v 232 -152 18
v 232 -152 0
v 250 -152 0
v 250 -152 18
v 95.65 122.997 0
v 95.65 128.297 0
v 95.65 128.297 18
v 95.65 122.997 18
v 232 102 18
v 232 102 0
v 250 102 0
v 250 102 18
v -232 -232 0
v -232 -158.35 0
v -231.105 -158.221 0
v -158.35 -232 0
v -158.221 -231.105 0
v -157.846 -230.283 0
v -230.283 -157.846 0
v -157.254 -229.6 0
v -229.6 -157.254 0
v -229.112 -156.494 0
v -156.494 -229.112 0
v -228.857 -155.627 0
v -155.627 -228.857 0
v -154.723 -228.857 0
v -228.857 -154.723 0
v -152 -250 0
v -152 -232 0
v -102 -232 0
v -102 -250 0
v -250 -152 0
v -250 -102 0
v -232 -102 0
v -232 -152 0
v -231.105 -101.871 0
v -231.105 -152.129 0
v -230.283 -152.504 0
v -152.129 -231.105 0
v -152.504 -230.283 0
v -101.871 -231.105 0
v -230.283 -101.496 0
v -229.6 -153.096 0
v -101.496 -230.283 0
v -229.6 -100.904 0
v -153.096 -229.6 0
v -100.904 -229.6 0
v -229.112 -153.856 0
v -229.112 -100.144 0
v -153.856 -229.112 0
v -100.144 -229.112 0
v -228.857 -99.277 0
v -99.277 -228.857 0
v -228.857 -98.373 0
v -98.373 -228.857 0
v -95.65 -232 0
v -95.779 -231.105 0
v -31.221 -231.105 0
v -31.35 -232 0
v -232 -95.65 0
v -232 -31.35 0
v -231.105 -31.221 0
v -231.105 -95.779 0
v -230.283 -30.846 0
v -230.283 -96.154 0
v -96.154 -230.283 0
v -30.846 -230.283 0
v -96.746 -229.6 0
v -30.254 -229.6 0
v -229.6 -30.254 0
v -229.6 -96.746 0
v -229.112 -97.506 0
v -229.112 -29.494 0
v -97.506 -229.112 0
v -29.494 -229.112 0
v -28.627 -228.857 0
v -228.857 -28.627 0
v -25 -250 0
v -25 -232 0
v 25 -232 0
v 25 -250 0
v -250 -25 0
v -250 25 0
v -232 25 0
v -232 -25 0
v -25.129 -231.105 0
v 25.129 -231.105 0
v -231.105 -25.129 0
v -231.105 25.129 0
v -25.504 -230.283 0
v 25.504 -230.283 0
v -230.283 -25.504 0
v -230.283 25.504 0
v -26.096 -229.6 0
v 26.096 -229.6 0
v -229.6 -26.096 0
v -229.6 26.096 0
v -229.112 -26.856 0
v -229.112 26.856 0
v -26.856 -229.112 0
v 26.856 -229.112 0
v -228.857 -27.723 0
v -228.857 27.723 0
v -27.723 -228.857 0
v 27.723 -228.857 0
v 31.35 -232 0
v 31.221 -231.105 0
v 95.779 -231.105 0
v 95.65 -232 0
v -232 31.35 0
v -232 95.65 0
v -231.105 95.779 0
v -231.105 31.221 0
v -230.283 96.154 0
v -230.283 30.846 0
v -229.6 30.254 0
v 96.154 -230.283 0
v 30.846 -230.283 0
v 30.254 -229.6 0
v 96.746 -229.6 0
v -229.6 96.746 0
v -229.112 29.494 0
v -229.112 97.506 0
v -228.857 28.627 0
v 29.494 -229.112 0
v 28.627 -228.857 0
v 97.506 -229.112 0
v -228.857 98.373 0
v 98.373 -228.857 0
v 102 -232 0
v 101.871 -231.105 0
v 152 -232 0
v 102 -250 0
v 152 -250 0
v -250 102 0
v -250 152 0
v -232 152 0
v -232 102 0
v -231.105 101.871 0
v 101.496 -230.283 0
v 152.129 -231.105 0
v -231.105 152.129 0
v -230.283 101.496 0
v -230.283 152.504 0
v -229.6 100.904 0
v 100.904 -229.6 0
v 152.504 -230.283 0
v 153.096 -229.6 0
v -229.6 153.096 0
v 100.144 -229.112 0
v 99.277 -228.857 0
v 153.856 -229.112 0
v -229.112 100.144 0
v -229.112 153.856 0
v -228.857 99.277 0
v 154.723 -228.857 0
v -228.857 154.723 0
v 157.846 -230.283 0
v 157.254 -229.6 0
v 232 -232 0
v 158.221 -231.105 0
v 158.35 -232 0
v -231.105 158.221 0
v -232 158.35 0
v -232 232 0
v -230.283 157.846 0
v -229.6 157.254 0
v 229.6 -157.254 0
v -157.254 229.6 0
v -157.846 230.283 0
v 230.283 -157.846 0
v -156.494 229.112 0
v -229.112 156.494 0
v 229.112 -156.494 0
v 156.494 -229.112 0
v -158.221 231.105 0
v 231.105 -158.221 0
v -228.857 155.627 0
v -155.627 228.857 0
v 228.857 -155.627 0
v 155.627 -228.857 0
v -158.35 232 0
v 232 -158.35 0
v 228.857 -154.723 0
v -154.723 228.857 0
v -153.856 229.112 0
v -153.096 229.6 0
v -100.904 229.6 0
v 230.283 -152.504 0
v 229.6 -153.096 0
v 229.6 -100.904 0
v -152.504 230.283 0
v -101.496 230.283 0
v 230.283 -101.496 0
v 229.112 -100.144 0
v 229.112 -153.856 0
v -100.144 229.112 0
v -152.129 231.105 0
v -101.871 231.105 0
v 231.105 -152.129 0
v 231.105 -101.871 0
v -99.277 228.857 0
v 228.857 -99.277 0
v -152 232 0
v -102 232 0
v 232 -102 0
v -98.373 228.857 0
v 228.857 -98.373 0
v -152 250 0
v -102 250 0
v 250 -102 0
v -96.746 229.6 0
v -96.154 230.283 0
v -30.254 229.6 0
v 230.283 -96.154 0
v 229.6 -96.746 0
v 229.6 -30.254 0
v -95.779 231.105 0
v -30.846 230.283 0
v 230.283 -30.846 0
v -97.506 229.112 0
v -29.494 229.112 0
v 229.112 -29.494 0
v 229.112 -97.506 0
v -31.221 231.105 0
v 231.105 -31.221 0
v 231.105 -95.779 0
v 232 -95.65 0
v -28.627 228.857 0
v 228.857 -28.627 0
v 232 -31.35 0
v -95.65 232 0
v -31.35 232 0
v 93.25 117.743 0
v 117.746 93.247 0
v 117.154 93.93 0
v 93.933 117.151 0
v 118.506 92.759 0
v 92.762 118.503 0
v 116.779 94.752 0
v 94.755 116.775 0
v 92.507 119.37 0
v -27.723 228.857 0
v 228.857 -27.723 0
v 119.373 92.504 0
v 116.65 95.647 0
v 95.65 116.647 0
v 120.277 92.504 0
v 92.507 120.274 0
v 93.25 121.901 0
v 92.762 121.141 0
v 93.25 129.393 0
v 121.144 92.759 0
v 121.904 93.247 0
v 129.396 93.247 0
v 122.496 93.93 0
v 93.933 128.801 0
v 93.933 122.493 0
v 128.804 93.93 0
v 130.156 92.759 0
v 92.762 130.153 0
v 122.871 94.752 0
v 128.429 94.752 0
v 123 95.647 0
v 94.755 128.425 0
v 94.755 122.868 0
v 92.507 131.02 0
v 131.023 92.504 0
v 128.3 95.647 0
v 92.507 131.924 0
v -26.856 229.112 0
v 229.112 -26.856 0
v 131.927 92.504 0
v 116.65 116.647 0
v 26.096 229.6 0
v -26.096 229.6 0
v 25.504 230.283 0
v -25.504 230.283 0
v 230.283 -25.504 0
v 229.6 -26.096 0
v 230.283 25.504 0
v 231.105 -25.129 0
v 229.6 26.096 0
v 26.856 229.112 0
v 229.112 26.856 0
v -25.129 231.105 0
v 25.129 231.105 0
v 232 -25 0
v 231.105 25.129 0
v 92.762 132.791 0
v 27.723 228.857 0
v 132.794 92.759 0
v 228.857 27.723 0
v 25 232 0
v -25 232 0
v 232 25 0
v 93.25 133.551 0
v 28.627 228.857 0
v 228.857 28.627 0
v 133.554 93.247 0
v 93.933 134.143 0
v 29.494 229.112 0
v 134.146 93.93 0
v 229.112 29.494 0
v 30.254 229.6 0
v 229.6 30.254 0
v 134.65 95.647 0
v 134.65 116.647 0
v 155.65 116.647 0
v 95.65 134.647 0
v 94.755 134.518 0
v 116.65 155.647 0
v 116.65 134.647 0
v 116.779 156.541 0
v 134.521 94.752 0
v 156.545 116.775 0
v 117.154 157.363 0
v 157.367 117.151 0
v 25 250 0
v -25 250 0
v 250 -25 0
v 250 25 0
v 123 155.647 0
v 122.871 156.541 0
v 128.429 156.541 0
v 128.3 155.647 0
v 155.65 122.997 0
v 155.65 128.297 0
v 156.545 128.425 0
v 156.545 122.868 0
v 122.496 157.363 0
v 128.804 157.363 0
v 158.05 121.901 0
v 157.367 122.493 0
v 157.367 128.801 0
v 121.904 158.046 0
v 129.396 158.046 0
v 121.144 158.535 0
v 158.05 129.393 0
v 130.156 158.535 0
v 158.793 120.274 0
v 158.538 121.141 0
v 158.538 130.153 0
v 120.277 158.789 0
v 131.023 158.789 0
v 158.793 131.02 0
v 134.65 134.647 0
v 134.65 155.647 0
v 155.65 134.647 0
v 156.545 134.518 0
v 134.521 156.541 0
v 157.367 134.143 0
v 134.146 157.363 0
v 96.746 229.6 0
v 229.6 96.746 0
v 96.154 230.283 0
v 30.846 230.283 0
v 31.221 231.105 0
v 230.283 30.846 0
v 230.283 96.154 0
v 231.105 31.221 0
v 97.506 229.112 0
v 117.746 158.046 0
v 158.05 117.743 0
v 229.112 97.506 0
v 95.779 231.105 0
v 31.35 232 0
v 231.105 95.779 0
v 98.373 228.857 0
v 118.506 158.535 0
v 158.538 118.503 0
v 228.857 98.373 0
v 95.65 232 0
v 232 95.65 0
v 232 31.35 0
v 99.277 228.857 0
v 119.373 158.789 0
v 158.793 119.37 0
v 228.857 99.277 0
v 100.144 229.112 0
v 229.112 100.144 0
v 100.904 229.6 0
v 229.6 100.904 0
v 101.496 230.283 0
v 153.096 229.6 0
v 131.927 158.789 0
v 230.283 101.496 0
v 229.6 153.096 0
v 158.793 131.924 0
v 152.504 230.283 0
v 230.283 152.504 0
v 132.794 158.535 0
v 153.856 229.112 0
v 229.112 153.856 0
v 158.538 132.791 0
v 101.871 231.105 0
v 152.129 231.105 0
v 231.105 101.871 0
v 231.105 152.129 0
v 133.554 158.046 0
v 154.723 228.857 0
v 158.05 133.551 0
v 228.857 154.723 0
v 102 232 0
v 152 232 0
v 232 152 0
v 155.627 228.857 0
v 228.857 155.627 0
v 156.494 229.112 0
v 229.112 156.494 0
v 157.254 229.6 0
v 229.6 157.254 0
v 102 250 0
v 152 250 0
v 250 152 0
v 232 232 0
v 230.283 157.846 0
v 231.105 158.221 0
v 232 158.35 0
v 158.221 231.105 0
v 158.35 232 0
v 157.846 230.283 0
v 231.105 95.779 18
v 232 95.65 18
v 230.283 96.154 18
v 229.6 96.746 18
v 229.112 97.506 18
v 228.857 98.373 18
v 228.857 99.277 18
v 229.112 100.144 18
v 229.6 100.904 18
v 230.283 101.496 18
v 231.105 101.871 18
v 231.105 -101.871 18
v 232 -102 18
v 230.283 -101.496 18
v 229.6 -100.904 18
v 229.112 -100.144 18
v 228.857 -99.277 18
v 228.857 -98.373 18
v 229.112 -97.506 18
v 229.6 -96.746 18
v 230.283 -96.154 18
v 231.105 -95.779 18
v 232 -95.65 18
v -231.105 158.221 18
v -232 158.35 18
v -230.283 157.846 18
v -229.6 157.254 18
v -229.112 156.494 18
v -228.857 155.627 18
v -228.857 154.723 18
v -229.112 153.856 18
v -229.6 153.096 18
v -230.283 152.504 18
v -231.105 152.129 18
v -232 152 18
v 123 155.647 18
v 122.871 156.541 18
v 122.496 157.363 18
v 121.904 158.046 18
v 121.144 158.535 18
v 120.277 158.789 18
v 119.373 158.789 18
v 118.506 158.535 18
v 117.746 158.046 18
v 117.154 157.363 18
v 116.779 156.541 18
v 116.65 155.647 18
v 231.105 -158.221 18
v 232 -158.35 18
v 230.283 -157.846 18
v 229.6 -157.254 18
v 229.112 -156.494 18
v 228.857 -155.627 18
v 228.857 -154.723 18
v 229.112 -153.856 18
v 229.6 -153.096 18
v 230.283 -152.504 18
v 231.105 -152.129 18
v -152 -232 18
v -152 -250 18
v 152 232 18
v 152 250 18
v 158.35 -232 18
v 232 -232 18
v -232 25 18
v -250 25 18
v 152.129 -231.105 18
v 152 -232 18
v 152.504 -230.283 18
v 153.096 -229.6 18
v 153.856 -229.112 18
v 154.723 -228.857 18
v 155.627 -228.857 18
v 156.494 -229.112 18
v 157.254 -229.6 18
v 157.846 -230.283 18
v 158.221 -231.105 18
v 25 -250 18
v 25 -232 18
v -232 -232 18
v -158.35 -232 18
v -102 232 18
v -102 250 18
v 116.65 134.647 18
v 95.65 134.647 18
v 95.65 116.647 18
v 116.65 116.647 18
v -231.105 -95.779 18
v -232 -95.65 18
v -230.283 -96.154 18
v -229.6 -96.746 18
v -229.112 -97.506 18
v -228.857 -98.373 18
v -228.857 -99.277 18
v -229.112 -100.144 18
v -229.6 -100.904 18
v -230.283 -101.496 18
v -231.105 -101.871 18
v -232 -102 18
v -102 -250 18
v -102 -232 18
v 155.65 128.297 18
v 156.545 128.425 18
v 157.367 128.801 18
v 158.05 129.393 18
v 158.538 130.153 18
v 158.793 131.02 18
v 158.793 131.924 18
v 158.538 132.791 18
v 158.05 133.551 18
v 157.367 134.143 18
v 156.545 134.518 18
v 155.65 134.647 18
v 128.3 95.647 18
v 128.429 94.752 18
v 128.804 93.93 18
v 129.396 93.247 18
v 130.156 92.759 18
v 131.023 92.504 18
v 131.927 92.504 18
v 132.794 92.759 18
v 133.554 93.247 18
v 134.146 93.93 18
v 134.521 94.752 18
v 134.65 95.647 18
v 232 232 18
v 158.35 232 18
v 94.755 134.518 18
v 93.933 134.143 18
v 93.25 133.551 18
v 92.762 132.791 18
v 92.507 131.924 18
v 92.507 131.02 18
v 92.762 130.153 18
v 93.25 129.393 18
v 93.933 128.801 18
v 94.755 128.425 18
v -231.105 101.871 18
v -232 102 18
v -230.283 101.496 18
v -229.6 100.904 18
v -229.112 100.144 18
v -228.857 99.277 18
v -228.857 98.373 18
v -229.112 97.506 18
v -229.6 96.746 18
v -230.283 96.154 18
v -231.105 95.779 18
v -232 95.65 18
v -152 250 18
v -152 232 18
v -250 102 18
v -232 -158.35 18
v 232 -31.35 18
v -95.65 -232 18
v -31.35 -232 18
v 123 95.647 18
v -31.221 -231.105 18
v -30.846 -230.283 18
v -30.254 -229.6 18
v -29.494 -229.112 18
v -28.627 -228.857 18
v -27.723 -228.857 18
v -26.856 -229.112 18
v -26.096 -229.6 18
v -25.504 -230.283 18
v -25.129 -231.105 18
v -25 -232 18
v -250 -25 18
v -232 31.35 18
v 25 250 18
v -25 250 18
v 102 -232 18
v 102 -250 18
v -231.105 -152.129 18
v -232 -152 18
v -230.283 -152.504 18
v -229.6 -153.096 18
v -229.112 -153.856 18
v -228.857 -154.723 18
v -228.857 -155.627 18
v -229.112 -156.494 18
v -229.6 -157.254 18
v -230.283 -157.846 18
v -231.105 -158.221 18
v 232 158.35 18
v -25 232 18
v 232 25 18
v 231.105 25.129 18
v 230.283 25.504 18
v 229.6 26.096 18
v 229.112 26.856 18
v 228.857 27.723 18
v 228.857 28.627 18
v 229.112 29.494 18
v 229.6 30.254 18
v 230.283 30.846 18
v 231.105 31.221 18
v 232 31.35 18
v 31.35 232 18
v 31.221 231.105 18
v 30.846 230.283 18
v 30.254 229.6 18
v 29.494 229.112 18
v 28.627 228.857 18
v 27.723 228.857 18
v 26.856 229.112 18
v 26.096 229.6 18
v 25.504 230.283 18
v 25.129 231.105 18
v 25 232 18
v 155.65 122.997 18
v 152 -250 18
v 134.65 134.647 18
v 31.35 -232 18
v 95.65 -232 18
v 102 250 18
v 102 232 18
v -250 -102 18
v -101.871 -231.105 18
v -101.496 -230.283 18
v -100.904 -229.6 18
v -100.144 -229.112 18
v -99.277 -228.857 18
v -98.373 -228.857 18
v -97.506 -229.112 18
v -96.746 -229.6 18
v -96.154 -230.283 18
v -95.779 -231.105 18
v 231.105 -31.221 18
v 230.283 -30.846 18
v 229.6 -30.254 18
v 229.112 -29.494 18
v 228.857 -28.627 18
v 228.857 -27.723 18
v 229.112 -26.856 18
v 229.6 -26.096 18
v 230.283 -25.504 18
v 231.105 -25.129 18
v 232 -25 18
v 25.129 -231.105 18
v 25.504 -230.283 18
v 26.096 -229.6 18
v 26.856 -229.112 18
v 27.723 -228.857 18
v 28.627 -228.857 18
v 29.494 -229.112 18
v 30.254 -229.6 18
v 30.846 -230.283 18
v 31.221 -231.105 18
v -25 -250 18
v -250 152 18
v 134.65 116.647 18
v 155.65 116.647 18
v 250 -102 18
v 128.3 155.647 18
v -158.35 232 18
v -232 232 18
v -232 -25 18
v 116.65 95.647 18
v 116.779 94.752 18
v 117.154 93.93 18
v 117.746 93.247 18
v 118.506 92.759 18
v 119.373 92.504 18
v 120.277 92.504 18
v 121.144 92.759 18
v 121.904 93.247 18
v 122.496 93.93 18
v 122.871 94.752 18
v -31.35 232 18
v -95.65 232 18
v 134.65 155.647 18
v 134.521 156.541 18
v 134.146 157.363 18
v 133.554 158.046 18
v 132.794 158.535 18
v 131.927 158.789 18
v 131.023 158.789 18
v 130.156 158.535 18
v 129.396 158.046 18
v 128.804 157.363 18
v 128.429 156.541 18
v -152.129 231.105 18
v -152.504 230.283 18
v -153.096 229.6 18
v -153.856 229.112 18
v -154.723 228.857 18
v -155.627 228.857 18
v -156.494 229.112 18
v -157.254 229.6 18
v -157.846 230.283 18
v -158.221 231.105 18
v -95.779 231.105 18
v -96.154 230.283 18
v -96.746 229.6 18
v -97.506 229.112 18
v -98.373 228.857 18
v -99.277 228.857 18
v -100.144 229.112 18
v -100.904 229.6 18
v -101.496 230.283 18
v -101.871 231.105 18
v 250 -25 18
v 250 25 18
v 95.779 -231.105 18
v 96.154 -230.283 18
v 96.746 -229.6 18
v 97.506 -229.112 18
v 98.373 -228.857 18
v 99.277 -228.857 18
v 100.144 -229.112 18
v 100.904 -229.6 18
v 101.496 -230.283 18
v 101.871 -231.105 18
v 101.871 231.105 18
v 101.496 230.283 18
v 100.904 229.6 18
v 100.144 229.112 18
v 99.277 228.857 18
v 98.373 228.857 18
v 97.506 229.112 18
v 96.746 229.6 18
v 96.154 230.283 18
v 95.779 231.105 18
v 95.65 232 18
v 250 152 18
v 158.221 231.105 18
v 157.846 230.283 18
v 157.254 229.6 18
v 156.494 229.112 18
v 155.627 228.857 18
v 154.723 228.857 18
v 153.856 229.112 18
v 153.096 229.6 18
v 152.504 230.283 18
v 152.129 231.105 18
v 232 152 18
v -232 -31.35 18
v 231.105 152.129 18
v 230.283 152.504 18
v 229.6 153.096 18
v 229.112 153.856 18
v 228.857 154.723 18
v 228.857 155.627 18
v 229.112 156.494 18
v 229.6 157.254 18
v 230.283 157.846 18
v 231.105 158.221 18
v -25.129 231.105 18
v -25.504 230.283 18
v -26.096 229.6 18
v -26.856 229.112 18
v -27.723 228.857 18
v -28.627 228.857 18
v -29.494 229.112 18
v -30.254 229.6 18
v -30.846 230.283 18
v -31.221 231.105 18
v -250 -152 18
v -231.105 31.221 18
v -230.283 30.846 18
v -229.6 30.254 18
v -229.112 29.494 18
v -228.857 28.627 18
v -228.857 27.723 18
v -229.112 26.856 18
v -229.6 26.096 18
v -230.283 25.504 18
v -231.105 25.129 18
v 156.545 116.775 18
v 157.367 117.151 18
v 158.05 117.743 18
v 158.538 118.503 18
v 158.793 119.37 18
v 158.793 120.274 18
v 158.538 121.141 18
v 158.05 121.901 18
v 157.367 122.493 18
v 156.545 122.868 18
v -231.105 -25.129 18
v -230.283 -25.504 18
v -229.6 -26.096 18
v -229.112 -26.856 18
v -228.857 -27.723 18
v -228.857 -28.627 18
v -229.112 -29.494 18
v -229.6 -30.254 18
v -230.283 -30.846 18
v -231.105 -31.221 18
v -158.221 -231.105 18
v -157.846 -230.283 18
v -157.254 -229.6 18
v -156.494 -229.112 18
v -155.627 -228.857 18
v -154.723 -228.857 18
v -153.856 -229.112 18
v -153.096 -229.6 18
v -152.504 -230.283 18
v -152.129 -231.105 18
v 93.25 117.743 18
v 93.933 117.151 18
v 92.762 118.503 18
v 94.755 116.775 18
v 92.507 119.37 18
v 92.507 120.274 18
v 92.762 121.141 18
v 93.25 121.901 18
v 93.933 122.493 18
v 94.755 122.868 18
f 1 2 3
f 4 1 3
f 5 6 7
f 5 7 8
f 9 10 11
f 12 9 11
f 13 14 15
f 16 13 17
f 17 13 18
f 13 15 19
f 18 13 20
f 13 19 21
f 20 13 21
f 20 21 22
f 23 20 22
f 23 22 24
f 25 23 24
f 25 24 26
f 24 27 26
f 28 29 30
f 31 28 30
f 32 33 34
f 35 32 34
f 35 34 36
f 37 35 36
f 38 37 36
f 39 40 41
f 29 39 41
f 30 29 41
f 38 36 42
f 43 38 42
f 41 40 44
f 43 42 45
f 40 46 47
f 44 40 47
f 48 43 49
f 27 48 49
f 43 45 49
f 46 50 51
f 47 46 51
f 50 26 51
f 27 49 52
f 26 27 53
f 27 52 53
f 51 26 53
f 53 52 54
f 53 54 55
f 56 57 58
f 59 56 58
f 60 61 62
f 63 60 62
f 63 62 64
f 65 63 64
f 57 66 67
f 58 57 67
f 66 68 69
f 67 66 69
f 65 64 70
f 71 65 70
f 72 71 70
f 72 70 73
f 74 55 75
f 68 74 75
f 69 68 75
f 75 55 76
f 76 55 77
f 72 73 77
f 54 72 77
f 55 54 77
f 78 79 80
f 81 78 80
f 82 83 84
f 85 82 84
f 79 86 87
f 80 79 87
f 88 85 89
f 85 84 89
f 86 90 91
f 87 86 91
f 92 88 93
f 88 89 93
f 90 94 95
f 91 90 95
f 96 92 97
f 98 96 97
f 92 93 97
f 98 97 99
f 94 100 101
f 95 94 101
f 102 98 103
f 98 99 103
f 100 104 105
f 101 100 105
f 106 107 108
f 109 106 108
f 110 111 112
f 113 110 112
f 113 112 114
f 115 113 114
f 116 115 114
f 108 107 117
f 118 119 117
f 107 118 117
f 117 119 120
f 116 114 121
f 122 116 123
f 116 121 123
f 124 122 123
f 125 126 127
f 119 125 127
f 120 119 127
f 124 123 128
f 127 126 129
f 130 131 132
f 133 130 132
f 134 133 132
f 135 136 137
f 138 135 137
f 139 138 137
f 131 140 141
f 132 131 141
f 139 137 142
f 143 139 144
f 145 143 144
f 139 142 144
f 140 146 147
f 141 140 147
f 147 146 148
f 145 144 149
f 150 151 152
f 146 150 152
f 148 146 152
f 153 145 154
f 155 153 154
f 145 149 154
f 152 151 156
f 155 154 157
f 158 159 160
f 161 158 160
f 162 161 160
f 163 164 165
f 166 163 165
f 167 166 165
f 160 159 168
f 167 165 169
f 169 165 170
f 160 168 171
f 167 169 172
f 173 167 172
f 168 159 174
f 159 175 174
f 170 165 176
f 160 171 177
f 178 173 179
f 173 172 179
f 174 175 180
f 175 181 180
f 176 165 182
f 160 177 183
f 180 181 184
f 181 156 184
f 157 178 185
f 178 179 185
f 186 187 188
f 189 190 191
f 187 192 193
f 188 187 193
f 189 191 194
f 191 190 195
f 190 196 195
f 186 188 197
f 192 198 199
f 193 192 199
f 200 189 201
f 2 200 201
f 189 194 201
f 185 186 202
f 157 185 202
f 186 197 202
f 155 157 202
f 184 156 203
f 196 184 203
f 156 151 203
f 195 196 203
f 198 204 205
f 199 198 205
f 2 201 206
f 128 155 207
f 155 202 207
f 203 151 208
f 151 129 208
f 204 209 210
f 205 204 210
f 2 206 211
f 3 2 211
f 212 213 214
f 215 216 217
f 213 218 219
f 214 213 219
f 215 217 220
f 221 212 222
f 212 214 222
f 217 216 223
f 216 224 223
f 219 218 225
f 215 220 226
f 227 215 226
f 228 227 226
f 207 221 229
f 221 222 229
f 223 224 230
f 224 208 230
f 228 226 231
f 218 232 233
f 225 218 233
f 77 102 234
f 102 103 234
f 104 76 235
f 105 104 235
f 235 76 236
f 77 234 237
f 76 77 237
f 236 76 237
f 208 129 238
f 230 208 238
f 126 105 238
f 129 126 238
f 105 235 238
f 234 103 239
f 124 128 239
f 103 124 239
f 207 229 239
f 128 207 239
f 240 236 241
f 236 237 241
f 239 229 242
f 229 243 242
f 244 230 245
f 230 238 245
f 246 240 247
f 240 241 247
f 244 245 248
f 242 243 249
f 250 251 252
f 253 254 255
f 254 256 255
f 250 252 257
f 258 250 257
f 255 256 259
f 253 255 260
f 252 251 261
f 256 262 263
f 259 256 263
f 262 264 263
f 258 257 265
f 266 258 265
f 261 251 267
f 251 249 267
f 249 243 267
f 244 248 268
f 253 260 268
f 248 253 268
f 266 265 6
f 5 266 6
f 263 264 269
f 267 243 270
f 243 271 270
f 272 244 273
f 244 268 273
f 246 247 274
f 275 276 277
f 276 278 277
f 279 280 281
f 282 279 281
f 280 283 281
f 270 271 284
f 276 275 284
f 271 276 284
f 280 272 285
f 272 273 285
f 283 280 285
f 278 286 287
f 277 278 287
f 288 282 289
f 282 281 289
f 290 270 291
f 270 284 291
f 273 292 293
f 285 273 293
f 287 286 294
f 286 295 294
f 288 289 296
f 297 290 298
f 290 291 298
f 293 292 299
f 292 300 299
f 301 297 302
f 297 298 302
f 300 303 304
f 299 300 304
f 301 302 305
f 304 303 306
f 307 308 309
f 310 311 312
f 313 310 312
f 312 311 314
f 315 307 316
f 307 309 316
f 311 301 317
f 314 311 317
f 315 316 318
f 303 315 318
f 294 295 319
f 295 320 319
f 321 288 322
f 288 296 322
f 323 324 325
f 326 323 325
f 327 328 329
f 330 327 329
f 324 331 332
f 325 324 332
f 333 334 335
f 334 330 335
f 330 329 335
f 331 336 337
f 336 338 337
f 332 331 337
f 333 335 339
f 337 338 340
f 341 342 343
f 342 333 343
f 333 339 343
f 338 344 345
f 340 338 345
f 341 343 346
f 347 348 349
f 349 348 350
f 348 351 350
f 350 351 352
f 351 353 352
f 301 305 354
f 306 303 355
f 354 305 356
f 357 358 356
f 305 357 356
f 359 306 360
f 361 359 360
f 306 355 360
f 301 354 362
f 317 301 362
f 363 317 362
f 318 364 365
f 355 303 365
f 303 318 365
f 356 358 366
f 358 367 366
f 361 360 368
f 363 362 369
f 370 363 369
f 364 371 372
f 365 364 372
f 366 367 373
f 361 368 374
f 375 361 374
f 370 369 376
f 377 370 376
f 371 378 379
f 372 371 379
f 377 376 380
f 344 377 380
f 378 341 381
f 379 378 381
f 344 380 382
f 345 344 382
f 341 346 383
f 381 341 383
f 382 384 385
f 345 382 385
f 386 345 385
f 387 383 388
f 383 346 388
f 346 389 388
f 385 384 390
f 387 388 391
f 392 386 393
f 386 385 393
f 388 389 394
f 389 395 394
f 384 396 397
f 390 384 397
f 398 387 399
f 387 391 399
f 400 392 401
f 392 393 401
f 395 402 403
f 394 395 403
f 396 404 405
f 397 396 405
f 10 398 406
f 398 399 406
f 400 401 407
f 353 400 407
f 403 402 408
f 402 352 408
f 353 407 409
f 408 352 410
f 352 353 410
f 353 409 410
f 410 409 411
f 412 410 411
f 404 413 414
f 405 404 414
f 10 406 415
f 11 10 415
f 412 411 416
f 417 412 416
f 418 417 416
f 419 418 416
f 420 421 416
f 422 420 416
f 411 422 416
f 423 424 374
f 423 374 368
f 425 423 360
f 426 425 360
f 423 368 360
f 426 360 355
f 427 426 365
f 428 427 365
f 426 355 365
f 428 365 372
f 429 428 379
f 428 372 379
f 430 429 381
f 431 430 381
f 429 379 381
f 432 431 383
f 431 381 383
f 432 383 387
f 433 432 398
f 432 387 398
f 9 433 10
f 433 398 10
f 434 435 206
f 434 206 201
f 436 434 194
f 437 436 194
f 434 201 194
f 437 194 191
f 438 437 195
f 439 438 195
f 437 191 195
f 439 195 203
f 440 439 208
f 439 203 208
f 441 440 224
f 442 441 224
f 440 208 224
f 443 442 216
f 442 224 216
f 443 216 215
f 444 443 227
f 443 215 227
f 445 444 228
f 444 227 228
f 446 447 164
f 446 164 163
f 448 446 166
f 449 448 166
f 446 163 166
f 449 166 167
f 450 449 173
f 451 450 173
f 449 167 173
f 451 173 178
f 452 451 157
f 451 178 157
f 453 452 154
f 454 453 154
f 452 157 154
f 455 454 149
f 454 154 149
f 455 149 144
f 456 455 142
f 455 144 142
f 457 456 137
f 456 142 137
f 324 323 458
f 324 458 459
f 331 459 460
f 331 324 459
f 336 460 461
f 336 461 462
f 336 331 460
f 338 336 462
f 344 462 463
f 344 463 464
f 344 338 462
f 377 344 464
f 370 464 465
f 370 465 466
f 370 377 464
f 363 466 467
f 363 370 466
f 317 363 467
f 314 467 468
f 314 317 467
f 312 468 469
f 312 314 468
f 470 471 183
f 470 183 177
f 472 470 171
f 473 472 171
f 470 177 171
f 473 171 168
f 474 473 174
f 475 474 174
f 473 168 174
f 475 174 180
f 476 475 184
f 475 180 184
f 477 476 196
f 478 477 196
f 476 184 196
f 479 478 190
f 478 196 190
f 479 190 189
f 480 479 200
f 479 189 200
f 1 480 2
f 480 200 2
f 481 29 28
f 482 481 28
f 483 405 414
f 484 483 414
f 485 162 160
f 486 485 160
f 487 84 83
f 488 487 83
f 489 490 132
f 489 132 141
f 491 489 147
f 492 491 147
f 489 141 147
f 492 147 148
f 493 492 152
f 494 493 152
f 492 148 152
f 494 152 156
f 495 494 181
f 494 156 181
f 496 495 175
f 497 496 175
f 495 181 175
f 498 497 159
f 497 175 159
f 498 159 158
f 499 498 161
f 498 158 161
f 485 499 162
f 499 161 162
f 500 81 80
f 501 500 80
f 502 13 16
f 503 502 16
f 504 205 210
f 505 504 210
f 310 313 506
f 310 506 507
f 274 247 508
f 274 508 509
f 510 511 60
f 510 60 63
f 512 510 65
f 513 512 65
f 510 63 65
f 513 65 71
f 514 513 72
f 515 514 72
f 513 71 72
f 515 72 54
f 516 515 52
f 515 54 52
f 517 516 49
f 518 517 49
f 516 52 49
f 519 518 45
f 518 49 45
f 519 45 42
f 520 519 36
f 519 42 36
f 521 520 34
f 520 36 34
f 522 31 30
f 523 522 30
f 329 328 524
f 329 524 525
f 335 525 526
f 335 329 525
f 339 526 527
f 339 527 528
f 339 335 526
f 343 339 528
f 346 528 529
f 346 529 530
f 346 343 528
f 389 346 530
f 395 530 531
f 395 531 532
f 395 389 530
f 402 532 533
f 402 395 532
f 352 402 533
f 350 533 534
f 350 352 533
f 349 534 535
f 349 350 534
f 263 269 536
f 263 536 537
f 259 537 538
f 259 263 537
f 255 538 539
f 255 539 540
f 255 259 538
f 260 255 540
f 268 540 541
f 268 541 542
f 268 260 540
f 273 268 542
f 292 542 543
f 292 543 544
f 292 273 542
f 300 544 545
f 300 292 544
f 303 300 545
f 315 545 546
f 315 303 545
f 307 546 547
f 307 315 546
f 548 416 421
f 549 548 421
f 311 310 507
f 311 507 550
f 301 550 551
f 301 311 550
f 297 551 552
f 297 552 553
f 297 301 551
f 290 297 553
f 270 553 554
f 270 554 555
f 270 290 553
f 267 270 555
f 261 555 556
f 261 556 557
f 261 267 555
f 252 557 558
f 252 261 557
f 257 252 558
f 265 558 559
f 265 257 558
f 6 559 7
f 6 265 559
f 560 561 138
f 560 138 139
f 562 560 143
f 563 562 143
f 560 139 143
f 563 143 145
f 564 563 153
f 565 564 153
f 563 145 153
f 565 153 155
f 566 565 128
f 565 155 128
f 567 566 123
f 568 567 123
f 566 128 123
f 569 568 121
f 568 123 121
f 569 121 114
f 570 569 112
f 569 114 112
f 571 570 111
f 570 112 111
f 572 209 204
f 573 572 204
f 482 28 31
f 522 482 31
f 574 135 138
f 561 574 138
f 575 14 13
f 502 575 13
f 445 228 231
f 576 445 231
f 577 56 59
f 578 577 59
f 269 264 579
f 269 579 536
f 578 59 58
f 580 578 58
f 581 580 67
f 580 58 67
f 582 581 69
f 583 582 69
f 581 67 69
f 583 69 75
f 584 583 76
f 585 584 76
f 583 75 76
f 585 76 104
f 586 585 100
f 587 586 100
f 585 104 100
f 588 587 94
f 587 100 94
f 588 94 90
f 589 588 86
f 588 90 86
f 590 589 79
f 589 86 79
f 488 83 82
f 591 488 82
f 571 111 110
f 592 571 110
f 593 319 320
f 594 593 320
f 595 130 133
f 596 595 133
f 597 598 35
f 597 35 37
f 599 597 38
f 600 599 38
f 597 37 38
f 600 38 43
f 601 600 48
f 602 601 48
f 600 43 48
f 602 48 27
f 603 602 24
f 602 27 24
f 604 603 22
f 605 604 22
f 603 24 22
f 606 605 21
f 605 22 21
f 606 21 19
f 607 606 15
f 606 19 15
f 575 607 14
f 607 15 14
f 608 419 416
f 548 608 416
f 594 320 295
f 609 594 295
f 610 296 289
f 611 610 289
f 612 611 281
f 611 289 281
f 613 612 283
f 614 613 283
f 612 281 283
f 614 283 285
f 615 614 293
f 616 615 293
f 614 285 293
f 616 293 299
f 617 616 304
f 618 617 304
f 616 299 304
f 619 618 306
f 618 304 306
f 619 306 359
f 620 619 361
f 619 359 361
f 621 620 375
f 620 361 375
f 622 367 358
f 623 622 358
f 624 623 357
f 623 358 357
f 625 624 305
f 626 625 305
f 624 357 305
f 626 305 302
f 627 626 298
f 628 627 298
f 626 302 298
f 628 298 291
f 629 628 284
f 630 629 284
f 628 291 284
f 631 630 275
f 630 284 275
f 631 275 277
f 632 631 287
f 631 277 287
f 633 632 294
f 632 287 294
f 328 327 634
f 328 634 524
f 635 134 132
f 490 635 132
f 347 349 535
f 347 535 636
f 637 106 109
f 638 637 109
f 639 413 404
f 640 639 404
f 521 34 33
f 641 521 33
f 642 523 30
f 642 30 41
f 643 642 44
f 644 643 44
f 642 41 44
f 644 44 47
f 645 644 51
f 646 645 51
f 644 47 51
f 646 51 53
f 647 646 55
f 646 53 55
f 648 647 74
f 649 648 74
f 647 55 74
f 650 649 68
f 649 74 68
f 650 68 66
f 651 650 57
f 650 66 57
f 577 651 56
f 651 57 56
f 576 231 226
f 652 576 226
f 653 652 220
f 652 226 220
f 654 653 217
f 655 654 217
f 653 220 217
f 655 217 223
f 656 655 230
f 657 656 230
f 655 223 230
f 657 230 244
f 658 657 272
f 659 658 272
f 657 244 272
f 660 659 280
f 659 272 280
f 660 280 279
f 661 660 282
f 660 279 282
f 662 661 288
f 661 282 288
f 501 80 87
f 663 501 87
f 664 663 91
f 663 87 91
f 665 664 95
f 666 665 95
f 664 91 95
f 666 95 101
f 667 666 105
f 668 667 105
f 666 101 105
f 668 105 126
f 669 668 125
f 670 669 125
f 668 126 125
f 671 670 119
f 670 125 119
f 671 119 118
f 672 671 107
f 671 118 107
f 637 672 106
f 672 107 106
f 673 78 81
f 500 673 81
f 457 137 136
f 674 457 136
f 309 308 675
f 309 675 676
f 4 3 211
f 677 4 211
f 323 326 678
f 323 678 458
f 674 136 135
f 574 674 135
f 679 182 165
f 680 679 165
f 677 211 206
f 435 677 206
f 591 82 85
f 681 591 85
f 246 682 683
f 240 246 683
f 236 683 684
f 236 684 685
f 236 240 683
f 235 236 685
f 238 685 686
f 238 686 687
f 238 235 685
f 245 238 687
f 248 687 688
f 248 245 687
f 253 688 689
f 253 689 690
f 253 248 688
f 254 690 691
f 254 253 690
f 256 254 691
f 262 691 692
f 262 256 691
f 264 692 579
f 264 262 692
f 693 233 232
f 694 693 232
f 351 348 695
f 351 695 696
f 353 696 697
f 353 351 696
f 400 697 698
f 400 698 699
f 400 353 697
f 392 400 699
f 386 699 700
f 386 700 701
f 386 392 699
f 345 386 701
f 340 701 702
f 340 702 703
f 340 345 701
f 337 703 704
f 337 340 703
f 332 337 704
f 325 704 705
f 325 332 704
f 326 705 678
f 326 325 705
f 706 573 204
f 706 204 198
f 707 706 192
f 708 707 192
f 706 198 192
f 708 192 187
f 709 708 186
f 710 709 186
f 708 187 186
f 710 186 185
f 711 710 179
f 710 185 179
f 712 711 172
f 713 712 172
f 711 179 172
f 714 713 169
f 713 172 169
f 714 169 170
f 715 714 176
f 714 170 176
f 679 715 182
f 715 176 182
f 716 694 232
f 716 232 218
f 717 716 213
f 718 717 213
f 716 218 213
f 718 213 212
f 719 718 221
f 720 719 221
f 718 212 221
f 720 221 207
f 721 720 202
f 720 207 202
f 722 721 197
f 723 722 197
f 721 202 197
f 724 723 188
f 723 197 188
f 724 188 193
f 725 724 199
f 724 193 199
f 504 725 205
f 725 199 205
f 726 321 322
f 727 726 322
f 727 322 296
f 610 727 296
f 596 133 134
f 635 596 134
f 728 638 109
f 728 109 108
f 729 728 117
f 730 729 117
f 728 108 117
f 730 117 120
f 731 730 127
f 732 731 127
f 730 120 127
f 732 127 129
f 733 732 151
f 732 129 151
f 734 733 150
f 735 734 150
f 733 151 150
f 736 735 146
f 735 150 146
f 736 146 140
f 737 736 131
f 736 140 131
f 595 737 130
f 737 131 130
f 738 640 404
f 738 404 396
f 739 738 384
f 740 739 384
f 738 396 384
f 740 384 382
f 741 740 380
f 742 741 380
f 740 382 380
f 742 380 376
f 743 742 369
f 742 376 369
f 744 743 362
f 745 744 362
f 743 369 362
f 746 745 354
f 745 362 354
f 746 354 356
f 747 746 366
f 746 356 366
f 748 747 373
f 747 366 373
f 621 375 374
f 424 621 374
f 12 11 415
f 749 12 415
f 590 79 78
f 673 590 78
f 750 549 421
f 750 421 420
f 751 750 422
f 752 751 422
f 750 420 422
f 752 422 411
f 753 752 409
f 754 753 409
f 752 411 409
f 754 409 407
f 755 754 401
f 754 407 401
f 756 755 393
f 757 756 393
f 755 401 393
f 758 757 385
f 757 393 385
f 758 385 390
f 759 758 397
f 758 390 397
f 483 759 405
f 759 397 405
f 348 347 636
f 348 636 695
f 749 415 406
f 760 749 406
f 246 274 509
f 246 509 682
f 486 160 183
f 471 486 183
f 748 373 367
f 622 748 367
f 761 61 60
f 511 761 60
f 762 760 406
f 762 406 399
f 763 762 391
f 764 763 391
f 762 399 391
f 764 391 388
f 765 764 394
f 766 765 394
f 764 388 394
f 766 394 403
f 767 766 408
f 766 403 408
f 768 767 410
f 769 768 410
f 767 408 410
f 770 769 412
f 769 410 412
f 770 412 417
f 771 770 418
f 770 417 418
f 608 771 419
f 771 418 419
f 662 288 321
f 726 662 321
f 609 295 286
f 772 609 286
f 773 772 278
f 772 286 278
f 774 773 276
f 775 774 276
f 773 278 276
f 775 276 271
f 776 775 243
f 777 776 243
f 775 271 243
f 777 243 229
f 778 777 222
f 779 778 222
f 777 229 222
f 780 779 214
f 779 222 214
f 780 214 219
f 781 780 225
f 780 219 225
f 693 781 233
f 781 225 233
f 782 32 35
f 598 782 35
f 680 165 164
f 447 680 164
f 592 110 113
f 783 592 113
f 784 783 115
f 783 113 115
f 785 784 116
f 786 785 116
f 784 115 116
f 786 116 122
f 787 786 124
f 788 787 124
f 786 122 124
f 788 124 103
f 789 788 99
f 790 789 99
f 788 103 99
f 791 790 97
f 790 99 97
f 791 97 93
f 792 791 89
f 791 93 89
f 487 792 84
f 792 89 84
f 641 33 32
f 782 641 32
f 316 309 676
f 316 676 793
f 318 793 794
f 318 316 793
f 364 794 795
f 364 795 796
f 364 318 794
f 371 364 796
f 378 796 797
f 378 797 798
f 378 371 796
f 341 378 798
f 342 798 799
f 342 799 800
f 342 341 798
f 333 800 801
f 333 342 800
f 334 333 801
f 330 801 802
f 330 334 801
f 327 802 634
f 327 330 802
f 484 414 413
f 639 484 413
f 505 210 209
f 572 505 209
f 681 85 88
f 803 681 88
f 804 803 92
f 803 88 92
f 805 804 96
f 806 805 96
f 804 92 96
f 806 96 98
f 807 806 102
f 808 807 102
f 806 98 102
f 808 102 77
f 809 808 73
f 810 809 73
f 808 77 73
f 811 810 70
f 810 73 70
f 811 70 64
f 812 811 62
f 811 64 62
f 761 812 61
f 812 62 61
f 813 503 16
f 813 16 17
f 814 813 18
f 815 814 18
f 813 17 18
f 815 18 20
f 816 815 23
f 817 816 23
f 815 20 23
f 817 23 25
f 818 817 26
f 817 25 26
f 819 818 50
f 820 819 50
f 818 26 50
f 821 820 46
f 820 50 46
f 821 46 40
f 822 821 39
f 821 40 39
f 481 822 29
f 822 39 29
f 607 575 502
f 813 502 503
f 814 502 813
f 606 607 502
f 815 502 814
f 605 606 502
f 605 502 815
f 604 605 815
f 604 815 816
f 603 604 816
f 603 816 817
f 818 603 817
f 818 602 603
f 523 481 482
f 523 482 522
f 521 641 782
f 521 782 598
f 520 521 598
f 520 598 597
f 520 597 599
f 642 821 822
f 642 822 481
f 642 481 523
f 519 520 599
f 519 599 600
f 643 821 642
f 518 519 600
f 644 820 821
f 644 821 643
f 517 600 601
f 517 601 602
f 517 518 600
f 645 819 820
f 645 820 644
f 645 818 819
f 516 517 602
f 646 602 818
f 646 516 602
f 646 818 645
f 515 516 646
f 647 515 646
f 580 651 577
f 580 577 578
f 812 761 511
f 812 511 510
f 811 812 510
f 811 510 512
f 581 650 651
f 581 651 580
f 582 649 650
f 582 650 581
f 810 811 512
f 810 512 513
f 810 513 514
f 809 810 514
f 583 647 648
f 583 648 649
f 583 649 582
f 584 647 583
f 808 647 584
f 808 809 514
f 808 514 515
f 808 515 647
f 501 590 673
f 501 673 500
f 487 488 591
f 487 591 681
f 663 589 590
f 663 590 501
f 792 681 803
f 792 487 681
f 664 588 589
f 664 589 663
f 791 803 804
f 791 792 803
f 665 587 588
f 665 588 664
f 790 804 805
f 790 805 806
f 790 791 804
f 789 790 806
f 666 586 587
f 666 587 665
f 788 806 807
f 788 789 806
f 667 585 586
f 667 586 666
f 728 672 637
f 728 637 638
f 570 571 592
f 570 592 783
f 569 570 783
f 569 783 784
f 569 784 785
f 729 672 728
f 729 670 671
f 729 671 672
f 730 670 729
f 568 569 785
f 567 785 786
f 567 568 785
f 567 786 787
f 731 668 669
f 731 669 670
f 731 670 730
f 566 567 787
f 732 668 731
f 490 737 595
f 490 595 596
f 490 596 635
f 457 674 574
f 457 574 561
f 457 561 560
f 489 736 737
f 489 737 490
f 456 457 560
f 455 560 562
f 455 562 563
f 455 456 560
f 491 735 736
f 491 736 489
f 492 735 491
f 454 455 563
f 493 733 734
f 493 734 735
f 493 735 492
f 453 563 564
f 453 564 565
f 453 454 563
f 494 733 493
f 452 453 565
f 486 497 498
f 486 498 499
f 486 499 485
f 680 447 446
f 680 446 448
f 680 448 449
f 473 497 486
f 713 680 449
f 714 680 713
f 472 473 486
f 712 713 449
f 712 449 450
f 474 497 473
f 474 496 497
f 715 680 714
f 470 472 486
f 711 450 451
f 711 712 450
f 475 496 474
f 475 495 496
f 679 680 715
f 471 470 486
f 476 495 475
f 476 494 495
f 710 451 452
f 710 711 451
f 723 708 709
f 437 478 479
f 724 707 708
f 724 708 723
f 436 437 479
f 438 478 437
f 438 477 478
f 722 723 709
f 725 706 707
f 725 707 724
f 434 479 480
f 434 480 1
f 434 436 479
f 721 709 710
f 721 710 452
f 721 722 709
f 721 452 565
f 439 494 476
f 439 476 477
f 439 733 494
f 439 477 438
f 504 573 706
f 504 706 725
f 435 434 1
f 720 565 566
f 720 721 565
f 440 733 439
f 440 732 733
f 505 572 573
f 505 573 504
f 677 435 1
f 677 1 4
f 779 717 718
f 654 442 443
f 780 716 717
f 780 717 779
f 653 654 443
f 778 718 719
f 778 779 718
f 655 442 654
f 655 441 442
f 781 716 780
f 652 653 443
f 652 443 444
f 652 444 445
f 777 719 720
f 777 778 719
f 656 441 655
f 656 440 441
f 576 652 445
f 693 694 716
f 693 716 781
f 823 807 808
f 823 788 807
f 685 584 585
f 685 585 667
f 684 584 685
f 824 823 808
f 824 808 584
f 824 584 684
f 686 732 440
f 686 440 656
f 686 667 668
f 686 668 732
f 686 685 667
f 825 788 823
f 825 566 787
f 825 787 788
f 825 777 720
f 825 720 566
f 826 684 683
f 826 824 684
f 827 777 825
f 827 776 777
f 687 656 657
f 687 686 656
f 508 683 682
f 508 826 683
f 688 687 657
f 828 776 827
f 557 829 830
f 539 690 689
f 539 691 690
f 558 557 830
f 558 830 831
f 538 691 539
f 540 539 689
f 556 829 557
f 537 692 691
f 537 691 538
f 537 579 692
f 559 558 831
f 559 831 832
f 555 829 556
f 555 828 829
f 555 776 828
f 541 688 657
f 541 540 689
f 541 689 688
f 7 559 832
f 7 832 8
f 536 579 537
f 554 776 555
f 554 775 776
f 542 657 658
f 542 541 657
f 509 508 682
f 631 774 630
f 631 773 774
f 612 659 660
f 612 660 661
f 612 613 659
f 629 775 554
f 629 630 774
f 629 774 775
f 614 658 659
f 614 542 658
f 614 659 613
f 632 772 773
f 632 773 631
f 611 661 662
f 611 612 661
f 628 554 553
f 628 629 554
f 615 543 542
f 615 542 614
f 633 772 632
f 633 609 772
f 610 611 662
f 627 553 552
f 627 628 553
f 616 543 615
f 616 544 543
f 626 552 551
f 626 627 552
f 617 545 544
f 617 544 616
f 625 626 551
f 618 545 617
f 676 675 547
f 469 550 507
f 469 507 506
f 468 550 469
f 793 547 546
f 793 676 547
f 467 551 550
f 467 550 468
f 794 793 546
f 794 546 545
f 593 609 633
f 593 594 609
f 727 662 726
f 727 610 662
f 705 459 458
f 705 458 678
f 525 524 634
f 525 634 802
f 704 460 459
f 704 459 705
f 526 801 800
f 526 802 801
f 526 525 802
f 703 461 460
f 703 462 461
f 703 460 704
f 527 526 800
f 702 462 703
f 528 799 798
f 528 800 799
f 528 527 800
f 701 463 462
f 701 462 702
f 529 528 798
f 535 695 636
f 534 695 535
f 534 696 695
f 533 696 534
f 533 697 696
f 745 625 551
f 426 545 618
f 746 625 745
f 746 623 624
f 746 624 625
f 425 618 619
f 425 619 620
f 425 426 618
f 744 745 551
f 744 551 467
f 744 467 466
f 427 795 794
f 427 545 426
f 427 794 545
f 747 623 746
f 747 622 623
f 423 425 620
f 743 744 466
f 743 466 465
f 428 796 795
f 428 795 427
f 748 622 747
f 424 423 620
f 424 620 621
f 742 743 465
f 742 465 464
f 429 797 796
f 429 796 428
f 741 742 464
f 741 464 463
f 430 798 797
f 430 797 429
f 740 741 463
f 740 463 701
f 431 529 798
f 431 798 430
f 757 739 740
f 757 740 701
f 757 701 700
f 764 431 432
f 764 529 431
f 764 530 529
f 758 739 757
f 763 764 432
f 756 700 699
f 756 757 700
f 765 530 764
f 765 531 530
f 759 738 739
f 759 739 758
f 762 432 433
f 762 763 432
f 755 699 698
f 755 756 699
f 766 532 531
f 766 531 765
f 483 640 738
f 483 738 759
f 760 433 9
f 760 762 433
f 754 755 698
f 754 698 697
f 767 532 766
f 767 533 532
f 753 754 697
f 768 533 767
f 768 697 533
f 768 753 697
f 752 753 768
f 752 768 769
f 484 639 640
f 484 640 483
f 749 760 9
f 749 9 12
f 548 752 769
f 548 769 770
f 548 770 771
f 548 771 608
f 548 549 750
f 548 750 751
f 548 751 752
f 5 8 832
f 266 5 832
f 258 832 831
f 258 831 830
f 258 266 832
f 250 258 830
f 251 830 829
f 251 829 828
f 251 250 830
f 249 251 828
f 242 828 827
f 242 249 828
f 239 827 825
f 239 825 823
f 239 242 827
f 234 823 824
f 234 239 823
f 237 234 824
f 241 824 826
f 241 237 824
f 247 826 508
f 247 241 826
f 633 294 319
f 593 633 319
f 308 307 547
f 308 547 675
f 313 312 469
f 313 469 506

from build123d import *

# Parameters (mm, degrees)
ESTRUSIONE_ESTRUSIONE1_DEPTH = 18


with BuildPart() as part:
    # Schizzo1 → Estrusione-Estrusione1 (new body)
    with BuildSketch(Plane.XY):
        with BuildLine():
            Line((-152, 250), (-152, 232))
            ThreePointArc((-152, 232), (-155.175, 228.825), (-158.35, 232))
            Line((-158.35, 232), (-232, 232))
            Line((-232, 232), (-232, 158.35))
            ThreePointArc((-232, 158.35), (-228.825, 155.175), (-232, 152))
            Line((-232, 152), (-250, 152))
            Line((-250, 152), (-250, 102))
            Line((-250, 102), (-232, 102))
            ThreePointArc((-232, 102), (-228.825, 98.825), (-232, 95.65))
            Line((-232, 95.65), (-232, 31.35))
            ThreePointArc((-232, 31.35), (-228.825, 28.175), (-232, 25))
            Line((-232, 25), (-250, 25))
            Line((-250, 25), (-250, -25))
            Line((-250, -25), (-232, -25))
            ThreePointArc((-232, -25), (-228.825, -28.175), (-232, -31.35))
            Line((-232, -31.35), (-232, -95.65))
            ThreePointArc((-232, -95.65), (-228.825, -98.825), (-232, -102))
            Line((-232, -102), (-250, -102))
            Line((-250, -102), (-250, -152))
            Line((-250, -152), (-232, -152))
            ThreePointArc((-232, -152), (-228.825, -155.175), (-232, -158.35))
            Line((-232, -158.35), (-232, -232))
            Line((-232, -232), (-158.35, -232))
            ThreePointArc((-158.35, -232), (-155.175, -228.825), (-152, -232))
            Line((-152, -232), (-152, -250))
            Line((-152, -250), (-102, -250))
            Line((-102, -250), (-102, -232))
            ThreePointArc((-102, -232), (-98.825, -228.825), (-95.65, -232))
            Line((-95.65, -232), (-31.35, -232))
            ThreePointArc((-31.35, -232), (-28.175, -228.825), (-25, -232))
            Line((-25, -232), (-25, -250))
            Line((-25, -250), (25, -250))
            Line((25, -250), (25, -232))
            ThreePointArc((25, -232), (28.175, -228.825), (31.35, -232))
            Line((31.35, -232), (95.65, -232))
            ThreePointArc((95.65, -232), (98.825, -228.825), (102, -232))
            Line((102, -232), (102, -250))
            Line((102, -250), (152, -250))
            Line((152, -250), (152, -232))
            ThreePointArc((152, -232), (155.175, -228.825), (158.35, -232))
            Line((158.35, -232), (232, -232))
            Line((232, -232), (232, -158.35))
            ThreePointArc((232, -158.35), (228.825, -155.175), (232, -152))
            Line((232, -152), (250, -152))
            Line((250, -152), (250, -102))
            Line((250, -102), (232, -102))
            ThreePointArc((232, -102), (228.825, -98.825), (232, -95.65))
            Line((232, -95.65), (232, -31.35))
            ThreePointArc((232, -31.35), (228.825, -28.175), (232, -25))
            Line((232, -25), (250, -25))
            Line((250, -25), (250, 25))
            Line((250, 25), (232, 25))
            ThreePointArc((232, 25), (228.825, 28.175), (232, 31.35))
            Line((232, 31.35), (232, 95.65))
            ThreePointArc((232, 95.65), (228.825, 98.825), (232, 102))
            Line((232, 102), (250, 102))
            Line((250, 102), (250, 152))
            Line((250, 152), (232, 152))
            ThreePointArc((232, 152), (228.825, 155.175), (232, 158.35))
            Line((232, 158.35), (232, 232))
            Line((232, 232), (158.35, 232))
            ThreePointArc((158.35, 232), (155.175, 228.825), (152, 232))
            Line((152, 232), (152, 250))
            Line((152, 250), (102, 250))
            Line((102, 250), (102, 232))
            ThreePointArc((102, 232), (98.825, 228.825), (95.65, 232))
            Line((95.65, 232), (31.35, 232))
            ThreePointArc((31.35, 232), (28.175, 228.825), (25, 232))
            Line((25, 232), (25, 250))
            Line((25, 250), (-25, 250))
            Line((-25, 250), (-25, 232))
            ThreePointArc((-25, 232), (-28.175, 228.825), (-31.35, 232))
            Line((-31.35, 232), (-95.65, 232))
            ThreePointArc((-95.65, 232), (-98.825, 228.825), (-102, 232))
            Line((-102, 232), (-102, 250))
            Line((-102, 250), (-152, 250))
        make_face()
        with BuildLine():
            Line((134.65, 95.646711769), (134.65, 116.646711769))
            Line((134.65, 116.646711769), (155.65, 116.646711769))
            ThreePointArc((155.65, 116.646711769), (158.825, 119.821711769), (155.65, 122.996711769))
            Line((155.65, 122.996711769), (155.65, 128.296711769))
            ThreePointArc((155.65, 128.296711769), (158.825, 131.471711769), (155.65, 134.646711769))
            Line((155.65, 134.646711769), (134.65, 134.646711769))
            Line((134.65, 134.646711769), (134.65, 155.646711769))
            ThreePointArc((134.65, 155.646711769), (131.475, 158.821711769), (128.3, 155.646711769))
            Line((128.3, 155.646711769), (123, 155.646711769))
            ThreePointArc((123, 155.646711769), (119.825, 158.821711769), (116.65, 155.646711769))
            Line((116.65, 155.646711769), (116.65, 134.646711769))
            Line((116.65, 134.646711769), (95.65, 134.646711769))
            ThreePointArc((95.65, 134.646711769), (92.475, 131.471711769), (95.65, 128.296711769))
            Line((95.65, 128.296711769), (95.65, 122.996711769))
            ThreePointArc((95.65, 122.996711769), (92.475, 119.821711769), (95.65, 116.646711769))
            Line((95.65, 116.646711769), (116.65, 116.646711769))
            Line((116.65, 116.646711769), (116.65, 95.646711769))
            ThreePointArc((116.65, 95.646711769), (119.825, 92.471711769), (123, 95.646711769))
            Line((123, 95.646711769), (128.3, 95.646711769))
            ThreePointArc((128.3, 95.646711769), (131.475, 92.471711769), (134.65, 95.646711769))
        make_face(mode=Mode.SUBTRACT)
    extrude(amount=ESTRUSIONE_ESTRUSIONE1_DEPTH)


solid = part.part
